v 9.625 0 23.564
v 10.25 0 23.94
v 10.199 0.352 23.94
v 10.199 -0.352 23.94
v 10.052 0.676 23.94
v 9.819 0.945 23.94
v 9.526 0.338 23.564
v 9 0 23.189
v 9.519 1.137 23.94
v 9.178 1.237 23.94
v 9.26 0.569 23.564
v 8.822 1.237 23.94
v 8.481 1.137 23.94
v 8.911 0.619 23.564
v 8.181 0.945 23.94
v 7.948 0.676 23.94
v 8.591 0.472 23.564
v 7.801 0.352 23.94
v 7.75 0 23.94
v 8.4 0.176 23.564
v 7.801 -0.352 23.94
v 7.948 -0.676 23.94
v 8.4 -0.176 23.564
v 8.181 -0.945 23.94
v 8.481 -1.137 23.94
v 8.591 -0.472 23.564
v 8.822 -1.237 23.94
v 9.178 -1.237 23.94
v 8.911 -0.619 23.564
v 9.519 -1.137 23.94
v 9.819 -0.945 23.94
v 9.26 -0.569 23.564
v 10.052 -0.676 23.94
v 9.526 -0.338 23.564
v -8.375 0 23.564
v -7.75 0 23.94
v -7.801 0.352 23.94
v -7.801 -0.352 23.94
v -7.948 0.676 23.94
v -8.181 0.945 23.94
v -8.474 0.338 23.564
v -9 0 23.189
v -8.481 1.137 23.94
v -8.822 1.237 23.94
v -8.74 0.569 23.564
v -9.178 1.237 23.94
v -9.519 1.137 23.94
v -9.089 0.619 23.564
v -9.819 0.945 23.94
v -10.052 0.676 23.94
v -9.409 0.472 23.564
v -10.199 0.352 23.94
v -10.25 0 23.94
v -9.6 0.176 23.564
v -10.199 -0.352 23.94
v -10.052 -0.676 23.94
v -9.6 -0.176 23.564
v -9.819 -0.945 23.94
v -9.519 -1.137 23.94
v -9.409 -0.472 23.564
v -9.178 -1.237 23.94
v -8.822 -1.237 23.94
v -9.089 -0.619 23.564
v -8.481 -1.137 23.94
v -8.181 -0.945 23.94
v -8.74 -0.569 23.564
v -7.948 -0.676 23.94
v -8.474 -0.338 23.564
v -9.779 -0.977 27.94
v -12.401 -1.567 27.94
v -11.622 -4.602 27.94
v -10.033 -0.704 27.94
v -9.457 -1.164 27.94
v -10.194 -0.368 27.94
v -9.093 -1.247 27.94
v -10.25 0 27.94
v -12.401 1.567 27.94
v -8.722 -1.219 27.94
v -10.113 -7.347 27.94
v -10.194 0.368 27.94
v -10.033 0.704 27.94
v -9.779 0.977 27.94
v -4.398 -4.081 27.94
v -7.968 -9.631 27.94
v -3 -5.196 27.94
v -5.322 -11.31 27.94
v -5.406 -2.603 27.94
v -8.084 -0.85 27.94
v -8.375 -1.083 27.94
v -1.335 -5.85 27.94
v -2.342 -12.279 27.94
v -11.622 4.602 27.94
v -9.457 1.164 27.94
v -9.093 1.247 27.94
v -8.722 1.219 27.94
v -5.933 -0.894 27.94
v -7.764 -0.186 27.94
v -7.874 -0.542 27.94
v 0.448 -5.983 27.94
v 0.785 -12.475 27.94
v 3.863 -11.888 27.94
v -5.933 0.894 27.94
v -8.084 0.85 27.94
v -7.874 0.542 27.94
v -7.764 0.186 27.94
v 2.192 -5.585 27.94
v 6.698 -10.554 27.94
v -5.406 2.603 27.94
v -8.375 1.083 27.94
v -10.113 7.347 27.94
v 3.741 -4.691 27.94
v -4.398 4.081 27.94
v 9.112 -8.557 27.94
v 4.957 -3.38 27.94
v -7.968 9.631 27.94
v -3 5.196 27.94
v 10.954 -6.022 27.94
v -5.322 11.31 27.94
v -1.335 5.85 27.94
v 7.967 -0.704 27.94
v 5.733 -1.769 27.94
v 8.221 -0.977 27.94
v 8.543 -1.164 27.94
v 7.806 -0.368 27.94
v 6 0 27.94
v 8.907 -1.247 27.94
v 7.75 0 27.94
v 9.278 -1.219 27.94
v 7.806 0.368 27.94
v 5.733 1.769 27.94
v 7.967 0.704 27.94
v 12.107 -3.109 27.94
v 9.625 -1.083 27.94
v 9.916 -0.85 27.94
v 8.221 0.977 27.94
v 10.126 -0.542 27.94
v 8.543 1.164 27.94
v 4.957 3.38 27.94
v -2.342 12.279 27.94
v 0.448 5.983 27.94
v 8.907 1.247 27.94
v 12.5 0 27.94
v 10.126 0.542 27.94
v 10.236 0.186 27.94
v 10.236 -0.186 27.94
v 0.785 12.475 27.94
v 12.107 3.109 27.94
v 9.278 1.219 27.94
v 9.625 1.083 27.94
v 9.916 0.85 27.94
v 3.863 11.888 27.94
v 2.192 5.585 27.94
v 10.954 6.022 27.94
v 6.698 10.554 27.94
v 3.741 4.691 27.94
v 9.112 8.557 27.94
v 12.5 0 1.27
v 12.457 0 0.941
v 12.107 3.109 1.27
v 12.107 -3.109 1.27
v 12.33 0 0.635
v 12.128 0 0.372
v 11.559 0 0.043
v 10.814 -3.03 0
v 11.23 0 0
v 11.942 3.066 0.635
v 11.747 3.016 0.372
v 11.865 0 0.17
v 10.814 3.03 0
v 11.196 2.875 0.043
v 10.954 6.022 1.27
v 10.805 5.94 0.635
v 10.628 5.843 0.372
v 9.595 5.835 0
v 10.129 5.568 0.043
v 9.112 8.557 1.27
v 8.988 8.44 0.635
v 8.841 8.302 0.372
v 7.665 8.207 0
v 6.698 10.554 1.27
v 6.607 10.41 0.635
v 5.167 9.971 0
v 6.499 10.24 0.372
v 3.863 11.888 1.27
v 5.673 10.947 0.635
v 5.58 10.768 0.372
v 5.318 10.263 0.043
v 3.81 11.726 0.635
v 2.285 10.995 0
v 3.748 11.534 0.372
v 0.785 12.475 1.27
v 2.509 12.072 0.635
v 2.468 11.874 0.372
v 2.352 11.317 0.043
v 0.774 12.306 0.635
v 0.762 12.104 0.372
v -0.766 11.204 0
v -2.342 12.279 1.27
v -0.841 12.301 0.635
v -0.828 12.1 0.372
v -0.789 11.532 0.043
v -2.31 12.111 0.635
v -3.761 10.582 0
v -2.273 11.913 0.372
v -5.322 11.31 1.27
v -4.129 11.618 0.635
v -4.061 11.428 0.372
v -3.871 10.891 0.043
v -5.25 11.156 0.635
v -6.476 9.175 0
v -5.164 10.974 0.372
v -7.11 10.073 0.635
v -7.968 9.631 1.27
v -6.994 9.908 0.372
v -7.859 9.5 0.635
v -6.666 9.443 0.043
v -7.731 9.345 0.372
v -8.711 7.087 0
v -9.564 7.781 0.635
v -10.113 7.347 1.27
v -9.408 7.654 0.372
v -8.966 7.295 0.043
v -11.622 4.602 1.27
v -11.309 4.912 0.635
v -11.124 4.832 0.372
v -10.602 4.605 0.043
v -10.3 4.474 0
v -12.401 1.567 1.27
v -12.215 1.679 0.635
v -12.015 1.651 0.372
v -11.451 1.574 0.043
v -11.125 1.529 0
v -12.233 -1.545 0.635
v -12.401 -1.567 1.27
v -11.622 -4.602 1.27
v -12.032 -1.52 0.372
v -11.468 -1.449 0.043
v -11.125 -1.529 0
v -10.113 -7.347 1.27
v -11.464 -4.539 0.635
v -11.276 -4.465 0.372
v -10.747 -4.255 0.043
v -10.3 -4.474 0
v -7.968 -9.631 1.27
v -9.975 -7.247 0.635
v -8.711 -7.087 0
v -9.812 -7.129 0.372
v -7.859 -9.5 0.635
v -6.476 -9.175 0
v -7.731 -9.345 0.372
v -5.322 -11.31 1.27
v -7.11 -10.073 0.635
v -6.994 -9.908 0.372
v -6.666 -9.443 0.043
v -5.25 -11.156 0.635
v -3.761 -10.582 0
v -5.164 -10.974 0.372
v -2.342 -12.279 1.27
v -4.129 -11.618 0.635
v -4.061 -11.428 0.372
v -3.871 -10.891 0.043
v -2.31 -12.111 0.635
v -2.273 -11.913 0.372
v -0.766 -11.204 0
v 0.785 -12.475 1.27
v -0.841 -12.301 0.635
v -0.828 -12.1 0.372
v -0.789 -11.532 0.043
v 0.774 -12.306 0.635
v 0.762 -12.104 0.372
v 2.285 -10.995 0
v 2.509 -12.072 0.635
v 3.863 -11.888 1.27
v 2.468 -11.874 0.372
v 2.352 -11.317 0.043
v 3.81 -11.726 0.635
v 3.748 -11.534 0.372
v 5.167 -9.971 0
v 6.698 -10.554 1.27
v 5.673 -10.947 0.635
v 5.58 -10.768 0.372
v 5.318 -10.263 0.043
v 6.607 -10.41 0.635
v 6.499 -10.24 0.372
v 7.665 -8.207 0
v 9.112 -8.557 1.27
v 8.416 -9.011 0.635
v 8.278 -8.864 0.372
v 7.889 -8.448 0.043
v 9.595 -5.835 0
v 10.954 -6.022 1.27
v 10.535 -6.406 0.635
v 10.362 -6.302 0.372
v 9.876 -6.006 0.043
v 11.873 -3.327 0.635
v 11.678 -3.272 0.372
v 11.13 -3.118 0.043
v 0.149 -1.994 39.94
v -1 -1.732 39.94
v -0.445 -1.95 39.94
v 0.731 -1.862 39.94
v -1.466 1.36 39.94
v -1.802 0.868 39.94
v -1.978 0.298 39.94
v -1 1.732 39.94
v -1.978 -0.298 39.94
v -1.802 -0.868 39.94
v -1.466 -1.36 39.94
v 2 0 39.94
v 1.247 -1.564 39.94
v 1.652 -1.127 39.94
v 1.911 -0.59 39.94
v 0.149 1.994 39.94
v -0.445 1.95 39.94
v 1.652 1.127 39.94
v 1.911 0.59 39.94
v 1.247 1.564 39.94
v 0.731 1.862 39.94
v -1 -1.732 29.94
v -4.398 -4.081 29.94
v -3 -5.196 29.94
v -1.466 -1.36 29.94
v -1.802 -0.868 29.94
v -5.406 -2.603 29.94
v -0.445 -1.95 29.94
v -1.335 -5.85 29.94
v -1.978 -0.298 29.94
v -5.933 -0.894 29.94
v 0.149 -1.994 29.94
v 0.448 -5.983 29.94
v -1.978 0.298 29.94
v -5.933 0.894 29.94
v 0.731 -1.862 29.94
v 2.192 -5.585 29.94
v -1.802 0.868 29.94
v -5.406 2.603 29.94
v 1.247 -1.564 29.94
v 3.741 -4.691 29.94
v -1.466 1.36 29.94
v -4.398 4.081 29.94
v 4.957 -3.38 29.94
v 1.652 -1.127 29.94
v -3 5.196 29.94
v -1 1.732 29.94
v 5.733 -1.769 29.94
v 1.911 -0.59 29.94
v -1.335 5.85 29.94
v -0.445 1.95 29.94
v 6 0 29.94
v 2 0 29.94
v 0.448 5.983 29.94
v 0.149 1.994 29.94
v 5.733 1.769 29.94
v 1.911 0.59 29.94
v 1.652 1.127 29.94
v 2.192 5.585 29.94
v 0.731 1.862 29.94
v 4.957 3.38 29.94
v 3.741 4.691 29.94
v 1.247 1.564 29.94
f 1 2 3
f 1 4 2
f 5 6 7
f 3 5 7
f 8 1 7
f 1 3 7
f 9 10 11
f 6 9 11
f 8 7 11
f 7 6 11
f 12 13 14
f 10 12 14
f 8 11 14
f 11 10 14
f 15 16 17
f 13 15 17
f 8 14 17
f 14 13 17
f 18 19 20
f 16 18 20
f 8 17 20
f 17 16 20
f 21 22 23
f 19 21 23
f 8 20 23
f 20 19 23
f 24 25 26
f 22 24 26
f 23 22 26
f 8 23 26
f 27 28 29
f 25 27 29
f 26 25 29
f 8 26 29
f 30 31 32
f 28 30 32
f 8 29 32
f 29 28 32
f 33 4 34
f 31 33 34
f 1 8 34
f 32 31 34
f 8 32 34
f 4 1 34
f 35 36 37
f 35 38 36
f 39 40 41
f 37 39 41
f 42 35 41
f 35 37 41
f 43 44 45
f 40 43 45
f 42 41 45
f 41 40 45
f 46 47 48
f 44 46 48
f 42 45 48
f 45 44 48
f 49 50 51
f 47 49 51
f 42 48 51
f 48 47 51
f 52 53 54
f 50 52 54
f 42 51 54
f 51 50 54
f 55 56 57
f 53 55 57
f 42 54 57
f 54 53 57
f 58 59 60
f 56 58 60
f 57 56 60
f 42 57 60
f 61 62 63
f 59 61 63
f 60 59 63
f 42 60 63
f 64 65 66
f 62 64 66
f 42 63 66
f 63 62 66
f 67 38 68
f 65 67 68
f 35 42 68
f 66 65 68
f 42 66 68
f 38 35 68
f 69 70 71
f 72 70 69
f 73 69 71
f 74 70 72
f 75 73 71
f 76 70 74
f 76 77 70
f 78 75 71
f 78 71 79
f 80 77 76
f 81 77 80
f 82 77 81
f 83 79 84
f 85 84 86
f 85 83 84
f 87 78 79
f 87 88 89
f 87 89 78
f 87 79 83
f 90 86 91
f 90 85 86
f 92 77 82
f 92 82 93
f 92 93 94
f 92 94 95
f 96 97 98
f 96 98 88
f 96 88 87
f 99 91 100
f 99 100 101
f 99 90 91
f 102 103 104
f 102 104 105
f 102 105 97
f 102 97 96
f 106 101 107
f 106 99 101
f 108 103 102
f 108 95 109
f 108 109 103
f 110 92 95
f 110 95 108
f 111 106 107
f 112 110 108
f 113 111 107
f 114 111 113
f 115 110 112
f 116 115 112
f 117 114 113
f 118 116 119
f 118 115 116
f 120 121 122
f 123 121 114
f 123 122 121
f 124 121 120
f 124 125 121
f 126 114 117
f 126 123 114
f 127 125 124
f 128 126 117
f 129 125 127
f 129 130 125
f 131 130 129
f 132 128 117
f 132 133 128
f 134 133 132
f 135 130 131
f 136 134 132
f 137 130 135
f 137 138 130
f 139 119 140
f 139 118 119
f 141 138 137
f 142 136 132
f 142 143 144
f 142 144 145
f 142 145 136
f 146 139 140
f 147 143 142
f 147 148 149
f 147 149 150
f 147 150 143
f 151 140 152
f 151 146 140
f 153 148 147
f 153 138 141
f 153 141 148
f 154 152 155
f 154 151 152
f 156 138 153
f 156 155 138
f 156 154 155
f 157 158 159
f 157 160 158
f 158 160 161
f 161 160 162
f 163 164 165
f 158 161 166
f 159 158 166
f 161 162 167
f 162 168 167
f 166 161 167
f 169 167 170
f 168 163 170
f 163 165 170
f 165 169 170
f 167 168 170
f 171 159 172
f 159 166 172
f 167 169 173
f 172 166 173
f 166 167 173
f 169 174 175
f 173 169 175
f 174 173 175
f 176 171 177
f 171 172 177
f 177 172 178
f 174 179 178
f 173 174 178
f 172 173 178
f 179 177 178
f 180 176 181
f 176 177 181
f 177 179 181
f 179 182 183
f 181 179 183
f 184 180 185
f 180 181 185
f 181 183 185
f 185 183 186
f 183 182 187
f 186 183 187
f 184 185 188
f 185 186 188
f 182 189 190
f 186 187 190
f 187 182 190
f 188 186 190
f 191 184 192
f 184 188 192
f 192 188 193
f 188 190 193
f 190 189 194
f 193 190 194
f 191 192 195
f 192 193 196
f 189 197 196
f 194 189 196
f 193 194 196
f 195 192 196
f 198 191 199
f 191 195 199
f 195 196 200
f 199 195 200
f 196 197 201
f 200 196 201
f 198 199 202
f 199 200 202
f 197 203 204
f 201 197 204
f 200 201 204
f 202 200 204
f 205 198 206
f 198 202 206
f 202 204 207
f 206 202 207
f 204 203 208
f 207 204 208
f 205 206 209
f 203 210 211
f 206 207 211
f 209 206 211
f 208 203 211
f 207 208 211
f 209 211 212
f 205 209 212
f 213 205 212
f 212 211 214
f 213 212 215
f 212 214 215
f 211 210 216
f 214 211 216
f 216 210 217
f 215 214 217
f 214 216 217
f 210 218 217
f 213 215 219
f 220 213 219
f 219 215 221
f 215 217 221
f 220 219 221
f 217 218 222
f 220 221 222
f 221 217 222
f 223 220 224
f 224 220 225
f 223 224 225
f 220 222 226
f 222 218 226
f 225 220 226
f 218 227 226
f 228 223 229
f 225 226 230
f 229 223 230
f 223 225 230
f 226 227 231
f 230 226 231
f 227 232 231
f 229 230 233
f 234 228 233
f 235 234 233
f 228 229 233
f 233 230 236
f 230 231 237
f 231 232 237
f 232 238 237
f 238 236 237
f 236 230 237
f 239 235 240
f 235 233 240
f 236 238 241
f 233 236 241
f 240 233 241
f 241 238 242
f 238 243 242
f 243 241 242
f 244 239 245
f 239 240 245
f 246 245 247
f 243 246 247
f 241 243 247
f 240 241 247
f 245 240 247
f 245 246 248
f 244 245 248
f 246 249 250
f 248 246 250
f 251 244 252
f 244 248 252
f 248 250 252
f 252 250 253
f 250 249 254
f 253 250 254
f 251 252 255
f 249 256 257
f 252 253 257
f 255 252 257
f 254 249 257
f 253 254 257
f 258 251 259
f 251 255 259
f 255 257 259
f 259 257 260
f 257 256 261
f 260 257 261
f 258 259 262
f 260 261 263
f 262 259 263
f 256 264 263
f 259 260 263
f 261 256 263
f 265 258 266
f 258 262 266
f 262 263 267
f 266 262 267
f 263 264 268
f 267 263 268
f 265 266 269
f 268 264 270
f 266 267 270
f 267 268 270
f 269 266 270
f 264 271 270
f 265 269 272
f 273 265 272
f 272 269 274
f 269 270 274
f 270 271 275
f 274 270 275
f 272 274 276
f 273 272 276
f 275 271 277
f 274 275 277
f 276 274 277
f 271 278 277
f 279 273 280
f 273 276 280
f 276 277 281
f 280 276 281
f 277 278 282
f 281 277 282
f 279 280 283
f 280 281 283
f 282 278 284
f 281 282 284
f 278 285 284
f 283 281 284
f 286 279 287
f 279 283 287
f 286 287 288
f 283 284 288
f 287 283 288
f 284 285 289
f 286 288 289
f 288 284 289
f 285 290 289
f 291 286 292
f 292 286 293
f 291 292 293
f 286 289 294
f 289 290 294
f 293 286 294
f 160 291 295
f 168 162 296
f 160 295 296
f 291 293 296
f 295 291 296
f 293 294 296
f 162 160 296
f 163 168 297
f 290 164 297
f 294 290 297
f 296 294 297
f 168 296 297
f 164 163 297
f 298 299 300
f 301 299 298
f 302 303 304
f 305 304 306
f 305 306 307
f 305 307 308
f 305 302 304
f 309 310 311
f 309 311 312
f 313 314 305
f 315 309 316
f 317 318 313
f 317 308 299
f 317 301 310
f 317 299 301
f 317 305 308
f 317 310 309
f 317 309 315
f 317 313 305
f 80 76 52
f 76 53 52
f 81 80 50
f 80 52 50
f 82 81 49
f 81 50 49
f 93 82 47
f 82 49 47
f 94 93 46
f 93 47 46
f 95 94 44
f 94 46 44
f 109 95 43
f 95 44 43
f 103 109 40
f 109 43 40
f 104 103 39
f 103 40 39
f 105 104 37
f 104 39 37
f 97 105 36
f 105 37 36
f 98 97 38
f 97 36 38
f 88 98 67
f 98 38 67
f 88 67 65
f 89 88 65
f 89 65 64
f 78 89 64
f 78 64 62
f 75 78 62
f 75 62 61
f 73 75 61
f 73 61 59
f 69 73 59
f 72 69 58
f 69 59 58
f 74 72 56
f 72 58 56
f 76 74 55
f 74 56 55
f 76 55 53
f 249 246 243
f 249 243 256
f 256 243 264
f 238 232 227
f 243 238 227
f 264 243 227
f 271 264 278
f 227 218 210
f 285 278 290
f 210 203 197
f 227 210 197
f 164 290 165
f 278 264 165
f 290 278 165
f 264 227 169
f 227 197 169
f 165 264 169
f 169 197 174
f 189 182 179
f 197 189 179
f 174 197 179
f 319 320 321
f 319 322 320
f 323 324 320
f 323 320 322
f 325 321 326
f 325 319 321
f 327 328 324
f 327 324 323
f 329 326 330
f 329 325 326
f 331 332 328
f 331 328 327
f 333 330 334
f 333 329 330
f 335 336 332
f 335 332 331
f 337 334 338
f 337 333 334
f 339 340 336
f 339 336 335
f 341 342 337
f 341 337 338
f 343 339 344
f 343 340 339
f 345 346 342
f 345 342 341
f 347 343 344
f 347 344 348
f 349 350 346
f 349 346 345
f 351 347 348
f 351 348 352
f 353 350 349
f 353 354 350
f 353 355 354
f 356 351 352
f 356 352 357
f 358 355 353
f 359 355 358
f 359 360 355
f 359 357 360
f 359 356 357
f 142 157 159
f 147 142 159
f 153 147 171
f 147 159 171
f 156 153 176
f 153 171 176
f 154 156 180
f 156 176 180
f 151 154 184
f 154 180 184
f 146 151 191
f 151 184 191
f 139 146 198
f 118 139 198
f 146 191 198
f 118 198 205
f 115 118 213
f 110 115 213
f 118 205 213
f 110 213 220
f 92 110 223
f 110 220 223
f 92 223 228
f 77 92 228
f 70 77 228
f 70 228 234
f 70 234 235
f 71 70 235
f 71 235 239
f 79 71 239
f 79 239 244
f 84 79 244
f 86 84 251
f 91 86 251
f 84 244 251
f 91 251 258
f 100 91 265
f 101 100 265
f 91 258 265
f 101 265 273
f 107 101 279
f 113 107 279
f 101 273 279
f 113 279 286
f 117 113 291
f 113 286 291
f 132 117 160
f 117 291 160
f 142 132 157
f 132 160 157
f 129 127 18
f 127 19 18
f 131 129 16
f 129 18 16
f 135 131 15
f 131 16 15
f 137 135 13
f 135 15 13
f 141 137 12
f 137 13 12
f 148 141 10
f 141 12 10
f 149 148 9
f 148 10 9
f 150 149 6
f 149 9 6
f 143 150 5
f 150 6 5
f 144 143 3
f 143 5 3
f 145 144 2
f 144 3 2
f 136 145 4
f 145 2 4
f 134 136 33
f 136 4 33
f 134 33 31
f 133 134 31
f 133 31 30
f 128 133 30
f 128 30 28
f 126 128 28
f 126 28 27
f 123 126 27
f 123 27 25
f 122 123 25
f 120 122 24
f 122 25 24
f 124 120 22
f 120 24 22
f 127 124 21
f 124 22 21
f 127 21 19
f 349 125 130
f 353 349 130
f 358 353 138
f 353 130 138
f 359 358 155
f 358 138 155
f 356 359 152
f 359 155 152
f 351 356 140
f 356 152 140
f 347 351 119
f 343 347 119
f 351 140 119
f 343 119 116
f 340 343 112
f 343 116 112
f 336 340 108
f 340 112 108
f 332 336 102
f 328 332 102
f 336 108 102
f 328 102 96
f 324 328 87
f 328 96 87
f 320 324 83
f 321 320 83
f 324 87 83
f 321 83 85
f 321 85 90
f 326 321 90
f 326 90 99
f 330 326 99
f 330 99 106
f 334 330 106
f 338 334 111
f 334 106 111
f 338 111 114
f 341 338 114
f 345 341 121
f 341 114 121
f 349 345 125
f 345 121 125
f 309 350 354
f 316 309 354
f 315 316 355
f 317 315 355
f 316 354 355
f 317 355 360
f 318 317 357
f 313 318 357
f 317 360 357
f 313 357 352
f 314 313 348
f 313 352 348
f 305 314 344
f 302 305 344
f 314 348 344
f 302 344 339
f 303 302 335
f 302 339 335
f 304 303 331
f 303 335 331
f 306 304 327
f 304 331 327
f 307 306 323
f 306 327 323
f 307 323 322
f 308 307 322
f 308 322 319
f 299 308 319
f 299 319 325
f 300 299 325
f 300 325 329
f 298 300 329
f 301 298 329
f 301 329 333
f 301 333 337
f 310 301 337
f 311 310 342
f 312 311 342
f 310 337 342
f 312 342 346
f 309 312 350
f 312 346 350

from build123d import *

# Parameters (mm, degrees)
SKETCH1_R                 = 12.5
BOSS_EXTRUDE1_DEPTH       = 27.94
SKETCH2_R                 = 6
BOSS_EXTRUDE2_DEPTH       = 2
SKETCH3_R                 = 2
BOSS_EXTRUDE3_DEPTH       = 10
M3X0_5_TAPPED_HOLE1_D     = 2.5
M3X0_5_TAPPED_HOLE1_DEPTH = 3.999992
M3X0_5_TAPPED_HOLE1_TIP   = 0.751075774
FILLET1_R                 = 1.27


with BuildPart() as part:
    # Sketch1 → Boss-Extrude1 (new body)
    with BuildSketch(Plane.XY):
        Circle(SKETCH1_R)
    extrude(amount=BOSS_EXTRUDE1_DEPTH)

    # Sketch2 → Boss-Extrude2 (add)
    with BuildSketch(Plane.XY.offset(27.94)):
        Circle(SKETCH2_R)
    extrude(amount=BOSS_EXTRUDE2_DEPTH)

    # Sketch3 → Boss-Extrude3 (add)
    with BuildSketch(Plane.XY.offset(29.94)):
        Circle(SKETCH3_R)
    extrude(amount=BOSS_EXTRUDE3_DEPTH)

    # M3x0.5 Tapped Hole1
    with Locations(Plane.XY.offset(27.94)):
        with Locations((-9, 0), (9, 0)):
            Hole(M3X0_5_TAPPED_HOLE1_D / 2, depth=M3X0_5_TAPPED_HOLE1_DEPTH)
            with Locations((0, 0, -(M3X0_5_TAPPED_HOLE1_DEPTH + M3X0_5_TAPPED_HOLE1_TIP / 2))):  # 118° drill point
                Cone(0, M3X0_5_TAPPED_HOLE1_D / 2, M3X0_5_TAPPED_HOLE1_TIP, mode=Mode.SUBTRACT)

    # Fillet1
    fillet1_edges = [part.edges().sort_by_distance(p)[0] for p in [
        (-12.5, 0, 0),
    ]]
    fillet(fillet1_edges, radius=FILLET1_R)


solid = part.part
